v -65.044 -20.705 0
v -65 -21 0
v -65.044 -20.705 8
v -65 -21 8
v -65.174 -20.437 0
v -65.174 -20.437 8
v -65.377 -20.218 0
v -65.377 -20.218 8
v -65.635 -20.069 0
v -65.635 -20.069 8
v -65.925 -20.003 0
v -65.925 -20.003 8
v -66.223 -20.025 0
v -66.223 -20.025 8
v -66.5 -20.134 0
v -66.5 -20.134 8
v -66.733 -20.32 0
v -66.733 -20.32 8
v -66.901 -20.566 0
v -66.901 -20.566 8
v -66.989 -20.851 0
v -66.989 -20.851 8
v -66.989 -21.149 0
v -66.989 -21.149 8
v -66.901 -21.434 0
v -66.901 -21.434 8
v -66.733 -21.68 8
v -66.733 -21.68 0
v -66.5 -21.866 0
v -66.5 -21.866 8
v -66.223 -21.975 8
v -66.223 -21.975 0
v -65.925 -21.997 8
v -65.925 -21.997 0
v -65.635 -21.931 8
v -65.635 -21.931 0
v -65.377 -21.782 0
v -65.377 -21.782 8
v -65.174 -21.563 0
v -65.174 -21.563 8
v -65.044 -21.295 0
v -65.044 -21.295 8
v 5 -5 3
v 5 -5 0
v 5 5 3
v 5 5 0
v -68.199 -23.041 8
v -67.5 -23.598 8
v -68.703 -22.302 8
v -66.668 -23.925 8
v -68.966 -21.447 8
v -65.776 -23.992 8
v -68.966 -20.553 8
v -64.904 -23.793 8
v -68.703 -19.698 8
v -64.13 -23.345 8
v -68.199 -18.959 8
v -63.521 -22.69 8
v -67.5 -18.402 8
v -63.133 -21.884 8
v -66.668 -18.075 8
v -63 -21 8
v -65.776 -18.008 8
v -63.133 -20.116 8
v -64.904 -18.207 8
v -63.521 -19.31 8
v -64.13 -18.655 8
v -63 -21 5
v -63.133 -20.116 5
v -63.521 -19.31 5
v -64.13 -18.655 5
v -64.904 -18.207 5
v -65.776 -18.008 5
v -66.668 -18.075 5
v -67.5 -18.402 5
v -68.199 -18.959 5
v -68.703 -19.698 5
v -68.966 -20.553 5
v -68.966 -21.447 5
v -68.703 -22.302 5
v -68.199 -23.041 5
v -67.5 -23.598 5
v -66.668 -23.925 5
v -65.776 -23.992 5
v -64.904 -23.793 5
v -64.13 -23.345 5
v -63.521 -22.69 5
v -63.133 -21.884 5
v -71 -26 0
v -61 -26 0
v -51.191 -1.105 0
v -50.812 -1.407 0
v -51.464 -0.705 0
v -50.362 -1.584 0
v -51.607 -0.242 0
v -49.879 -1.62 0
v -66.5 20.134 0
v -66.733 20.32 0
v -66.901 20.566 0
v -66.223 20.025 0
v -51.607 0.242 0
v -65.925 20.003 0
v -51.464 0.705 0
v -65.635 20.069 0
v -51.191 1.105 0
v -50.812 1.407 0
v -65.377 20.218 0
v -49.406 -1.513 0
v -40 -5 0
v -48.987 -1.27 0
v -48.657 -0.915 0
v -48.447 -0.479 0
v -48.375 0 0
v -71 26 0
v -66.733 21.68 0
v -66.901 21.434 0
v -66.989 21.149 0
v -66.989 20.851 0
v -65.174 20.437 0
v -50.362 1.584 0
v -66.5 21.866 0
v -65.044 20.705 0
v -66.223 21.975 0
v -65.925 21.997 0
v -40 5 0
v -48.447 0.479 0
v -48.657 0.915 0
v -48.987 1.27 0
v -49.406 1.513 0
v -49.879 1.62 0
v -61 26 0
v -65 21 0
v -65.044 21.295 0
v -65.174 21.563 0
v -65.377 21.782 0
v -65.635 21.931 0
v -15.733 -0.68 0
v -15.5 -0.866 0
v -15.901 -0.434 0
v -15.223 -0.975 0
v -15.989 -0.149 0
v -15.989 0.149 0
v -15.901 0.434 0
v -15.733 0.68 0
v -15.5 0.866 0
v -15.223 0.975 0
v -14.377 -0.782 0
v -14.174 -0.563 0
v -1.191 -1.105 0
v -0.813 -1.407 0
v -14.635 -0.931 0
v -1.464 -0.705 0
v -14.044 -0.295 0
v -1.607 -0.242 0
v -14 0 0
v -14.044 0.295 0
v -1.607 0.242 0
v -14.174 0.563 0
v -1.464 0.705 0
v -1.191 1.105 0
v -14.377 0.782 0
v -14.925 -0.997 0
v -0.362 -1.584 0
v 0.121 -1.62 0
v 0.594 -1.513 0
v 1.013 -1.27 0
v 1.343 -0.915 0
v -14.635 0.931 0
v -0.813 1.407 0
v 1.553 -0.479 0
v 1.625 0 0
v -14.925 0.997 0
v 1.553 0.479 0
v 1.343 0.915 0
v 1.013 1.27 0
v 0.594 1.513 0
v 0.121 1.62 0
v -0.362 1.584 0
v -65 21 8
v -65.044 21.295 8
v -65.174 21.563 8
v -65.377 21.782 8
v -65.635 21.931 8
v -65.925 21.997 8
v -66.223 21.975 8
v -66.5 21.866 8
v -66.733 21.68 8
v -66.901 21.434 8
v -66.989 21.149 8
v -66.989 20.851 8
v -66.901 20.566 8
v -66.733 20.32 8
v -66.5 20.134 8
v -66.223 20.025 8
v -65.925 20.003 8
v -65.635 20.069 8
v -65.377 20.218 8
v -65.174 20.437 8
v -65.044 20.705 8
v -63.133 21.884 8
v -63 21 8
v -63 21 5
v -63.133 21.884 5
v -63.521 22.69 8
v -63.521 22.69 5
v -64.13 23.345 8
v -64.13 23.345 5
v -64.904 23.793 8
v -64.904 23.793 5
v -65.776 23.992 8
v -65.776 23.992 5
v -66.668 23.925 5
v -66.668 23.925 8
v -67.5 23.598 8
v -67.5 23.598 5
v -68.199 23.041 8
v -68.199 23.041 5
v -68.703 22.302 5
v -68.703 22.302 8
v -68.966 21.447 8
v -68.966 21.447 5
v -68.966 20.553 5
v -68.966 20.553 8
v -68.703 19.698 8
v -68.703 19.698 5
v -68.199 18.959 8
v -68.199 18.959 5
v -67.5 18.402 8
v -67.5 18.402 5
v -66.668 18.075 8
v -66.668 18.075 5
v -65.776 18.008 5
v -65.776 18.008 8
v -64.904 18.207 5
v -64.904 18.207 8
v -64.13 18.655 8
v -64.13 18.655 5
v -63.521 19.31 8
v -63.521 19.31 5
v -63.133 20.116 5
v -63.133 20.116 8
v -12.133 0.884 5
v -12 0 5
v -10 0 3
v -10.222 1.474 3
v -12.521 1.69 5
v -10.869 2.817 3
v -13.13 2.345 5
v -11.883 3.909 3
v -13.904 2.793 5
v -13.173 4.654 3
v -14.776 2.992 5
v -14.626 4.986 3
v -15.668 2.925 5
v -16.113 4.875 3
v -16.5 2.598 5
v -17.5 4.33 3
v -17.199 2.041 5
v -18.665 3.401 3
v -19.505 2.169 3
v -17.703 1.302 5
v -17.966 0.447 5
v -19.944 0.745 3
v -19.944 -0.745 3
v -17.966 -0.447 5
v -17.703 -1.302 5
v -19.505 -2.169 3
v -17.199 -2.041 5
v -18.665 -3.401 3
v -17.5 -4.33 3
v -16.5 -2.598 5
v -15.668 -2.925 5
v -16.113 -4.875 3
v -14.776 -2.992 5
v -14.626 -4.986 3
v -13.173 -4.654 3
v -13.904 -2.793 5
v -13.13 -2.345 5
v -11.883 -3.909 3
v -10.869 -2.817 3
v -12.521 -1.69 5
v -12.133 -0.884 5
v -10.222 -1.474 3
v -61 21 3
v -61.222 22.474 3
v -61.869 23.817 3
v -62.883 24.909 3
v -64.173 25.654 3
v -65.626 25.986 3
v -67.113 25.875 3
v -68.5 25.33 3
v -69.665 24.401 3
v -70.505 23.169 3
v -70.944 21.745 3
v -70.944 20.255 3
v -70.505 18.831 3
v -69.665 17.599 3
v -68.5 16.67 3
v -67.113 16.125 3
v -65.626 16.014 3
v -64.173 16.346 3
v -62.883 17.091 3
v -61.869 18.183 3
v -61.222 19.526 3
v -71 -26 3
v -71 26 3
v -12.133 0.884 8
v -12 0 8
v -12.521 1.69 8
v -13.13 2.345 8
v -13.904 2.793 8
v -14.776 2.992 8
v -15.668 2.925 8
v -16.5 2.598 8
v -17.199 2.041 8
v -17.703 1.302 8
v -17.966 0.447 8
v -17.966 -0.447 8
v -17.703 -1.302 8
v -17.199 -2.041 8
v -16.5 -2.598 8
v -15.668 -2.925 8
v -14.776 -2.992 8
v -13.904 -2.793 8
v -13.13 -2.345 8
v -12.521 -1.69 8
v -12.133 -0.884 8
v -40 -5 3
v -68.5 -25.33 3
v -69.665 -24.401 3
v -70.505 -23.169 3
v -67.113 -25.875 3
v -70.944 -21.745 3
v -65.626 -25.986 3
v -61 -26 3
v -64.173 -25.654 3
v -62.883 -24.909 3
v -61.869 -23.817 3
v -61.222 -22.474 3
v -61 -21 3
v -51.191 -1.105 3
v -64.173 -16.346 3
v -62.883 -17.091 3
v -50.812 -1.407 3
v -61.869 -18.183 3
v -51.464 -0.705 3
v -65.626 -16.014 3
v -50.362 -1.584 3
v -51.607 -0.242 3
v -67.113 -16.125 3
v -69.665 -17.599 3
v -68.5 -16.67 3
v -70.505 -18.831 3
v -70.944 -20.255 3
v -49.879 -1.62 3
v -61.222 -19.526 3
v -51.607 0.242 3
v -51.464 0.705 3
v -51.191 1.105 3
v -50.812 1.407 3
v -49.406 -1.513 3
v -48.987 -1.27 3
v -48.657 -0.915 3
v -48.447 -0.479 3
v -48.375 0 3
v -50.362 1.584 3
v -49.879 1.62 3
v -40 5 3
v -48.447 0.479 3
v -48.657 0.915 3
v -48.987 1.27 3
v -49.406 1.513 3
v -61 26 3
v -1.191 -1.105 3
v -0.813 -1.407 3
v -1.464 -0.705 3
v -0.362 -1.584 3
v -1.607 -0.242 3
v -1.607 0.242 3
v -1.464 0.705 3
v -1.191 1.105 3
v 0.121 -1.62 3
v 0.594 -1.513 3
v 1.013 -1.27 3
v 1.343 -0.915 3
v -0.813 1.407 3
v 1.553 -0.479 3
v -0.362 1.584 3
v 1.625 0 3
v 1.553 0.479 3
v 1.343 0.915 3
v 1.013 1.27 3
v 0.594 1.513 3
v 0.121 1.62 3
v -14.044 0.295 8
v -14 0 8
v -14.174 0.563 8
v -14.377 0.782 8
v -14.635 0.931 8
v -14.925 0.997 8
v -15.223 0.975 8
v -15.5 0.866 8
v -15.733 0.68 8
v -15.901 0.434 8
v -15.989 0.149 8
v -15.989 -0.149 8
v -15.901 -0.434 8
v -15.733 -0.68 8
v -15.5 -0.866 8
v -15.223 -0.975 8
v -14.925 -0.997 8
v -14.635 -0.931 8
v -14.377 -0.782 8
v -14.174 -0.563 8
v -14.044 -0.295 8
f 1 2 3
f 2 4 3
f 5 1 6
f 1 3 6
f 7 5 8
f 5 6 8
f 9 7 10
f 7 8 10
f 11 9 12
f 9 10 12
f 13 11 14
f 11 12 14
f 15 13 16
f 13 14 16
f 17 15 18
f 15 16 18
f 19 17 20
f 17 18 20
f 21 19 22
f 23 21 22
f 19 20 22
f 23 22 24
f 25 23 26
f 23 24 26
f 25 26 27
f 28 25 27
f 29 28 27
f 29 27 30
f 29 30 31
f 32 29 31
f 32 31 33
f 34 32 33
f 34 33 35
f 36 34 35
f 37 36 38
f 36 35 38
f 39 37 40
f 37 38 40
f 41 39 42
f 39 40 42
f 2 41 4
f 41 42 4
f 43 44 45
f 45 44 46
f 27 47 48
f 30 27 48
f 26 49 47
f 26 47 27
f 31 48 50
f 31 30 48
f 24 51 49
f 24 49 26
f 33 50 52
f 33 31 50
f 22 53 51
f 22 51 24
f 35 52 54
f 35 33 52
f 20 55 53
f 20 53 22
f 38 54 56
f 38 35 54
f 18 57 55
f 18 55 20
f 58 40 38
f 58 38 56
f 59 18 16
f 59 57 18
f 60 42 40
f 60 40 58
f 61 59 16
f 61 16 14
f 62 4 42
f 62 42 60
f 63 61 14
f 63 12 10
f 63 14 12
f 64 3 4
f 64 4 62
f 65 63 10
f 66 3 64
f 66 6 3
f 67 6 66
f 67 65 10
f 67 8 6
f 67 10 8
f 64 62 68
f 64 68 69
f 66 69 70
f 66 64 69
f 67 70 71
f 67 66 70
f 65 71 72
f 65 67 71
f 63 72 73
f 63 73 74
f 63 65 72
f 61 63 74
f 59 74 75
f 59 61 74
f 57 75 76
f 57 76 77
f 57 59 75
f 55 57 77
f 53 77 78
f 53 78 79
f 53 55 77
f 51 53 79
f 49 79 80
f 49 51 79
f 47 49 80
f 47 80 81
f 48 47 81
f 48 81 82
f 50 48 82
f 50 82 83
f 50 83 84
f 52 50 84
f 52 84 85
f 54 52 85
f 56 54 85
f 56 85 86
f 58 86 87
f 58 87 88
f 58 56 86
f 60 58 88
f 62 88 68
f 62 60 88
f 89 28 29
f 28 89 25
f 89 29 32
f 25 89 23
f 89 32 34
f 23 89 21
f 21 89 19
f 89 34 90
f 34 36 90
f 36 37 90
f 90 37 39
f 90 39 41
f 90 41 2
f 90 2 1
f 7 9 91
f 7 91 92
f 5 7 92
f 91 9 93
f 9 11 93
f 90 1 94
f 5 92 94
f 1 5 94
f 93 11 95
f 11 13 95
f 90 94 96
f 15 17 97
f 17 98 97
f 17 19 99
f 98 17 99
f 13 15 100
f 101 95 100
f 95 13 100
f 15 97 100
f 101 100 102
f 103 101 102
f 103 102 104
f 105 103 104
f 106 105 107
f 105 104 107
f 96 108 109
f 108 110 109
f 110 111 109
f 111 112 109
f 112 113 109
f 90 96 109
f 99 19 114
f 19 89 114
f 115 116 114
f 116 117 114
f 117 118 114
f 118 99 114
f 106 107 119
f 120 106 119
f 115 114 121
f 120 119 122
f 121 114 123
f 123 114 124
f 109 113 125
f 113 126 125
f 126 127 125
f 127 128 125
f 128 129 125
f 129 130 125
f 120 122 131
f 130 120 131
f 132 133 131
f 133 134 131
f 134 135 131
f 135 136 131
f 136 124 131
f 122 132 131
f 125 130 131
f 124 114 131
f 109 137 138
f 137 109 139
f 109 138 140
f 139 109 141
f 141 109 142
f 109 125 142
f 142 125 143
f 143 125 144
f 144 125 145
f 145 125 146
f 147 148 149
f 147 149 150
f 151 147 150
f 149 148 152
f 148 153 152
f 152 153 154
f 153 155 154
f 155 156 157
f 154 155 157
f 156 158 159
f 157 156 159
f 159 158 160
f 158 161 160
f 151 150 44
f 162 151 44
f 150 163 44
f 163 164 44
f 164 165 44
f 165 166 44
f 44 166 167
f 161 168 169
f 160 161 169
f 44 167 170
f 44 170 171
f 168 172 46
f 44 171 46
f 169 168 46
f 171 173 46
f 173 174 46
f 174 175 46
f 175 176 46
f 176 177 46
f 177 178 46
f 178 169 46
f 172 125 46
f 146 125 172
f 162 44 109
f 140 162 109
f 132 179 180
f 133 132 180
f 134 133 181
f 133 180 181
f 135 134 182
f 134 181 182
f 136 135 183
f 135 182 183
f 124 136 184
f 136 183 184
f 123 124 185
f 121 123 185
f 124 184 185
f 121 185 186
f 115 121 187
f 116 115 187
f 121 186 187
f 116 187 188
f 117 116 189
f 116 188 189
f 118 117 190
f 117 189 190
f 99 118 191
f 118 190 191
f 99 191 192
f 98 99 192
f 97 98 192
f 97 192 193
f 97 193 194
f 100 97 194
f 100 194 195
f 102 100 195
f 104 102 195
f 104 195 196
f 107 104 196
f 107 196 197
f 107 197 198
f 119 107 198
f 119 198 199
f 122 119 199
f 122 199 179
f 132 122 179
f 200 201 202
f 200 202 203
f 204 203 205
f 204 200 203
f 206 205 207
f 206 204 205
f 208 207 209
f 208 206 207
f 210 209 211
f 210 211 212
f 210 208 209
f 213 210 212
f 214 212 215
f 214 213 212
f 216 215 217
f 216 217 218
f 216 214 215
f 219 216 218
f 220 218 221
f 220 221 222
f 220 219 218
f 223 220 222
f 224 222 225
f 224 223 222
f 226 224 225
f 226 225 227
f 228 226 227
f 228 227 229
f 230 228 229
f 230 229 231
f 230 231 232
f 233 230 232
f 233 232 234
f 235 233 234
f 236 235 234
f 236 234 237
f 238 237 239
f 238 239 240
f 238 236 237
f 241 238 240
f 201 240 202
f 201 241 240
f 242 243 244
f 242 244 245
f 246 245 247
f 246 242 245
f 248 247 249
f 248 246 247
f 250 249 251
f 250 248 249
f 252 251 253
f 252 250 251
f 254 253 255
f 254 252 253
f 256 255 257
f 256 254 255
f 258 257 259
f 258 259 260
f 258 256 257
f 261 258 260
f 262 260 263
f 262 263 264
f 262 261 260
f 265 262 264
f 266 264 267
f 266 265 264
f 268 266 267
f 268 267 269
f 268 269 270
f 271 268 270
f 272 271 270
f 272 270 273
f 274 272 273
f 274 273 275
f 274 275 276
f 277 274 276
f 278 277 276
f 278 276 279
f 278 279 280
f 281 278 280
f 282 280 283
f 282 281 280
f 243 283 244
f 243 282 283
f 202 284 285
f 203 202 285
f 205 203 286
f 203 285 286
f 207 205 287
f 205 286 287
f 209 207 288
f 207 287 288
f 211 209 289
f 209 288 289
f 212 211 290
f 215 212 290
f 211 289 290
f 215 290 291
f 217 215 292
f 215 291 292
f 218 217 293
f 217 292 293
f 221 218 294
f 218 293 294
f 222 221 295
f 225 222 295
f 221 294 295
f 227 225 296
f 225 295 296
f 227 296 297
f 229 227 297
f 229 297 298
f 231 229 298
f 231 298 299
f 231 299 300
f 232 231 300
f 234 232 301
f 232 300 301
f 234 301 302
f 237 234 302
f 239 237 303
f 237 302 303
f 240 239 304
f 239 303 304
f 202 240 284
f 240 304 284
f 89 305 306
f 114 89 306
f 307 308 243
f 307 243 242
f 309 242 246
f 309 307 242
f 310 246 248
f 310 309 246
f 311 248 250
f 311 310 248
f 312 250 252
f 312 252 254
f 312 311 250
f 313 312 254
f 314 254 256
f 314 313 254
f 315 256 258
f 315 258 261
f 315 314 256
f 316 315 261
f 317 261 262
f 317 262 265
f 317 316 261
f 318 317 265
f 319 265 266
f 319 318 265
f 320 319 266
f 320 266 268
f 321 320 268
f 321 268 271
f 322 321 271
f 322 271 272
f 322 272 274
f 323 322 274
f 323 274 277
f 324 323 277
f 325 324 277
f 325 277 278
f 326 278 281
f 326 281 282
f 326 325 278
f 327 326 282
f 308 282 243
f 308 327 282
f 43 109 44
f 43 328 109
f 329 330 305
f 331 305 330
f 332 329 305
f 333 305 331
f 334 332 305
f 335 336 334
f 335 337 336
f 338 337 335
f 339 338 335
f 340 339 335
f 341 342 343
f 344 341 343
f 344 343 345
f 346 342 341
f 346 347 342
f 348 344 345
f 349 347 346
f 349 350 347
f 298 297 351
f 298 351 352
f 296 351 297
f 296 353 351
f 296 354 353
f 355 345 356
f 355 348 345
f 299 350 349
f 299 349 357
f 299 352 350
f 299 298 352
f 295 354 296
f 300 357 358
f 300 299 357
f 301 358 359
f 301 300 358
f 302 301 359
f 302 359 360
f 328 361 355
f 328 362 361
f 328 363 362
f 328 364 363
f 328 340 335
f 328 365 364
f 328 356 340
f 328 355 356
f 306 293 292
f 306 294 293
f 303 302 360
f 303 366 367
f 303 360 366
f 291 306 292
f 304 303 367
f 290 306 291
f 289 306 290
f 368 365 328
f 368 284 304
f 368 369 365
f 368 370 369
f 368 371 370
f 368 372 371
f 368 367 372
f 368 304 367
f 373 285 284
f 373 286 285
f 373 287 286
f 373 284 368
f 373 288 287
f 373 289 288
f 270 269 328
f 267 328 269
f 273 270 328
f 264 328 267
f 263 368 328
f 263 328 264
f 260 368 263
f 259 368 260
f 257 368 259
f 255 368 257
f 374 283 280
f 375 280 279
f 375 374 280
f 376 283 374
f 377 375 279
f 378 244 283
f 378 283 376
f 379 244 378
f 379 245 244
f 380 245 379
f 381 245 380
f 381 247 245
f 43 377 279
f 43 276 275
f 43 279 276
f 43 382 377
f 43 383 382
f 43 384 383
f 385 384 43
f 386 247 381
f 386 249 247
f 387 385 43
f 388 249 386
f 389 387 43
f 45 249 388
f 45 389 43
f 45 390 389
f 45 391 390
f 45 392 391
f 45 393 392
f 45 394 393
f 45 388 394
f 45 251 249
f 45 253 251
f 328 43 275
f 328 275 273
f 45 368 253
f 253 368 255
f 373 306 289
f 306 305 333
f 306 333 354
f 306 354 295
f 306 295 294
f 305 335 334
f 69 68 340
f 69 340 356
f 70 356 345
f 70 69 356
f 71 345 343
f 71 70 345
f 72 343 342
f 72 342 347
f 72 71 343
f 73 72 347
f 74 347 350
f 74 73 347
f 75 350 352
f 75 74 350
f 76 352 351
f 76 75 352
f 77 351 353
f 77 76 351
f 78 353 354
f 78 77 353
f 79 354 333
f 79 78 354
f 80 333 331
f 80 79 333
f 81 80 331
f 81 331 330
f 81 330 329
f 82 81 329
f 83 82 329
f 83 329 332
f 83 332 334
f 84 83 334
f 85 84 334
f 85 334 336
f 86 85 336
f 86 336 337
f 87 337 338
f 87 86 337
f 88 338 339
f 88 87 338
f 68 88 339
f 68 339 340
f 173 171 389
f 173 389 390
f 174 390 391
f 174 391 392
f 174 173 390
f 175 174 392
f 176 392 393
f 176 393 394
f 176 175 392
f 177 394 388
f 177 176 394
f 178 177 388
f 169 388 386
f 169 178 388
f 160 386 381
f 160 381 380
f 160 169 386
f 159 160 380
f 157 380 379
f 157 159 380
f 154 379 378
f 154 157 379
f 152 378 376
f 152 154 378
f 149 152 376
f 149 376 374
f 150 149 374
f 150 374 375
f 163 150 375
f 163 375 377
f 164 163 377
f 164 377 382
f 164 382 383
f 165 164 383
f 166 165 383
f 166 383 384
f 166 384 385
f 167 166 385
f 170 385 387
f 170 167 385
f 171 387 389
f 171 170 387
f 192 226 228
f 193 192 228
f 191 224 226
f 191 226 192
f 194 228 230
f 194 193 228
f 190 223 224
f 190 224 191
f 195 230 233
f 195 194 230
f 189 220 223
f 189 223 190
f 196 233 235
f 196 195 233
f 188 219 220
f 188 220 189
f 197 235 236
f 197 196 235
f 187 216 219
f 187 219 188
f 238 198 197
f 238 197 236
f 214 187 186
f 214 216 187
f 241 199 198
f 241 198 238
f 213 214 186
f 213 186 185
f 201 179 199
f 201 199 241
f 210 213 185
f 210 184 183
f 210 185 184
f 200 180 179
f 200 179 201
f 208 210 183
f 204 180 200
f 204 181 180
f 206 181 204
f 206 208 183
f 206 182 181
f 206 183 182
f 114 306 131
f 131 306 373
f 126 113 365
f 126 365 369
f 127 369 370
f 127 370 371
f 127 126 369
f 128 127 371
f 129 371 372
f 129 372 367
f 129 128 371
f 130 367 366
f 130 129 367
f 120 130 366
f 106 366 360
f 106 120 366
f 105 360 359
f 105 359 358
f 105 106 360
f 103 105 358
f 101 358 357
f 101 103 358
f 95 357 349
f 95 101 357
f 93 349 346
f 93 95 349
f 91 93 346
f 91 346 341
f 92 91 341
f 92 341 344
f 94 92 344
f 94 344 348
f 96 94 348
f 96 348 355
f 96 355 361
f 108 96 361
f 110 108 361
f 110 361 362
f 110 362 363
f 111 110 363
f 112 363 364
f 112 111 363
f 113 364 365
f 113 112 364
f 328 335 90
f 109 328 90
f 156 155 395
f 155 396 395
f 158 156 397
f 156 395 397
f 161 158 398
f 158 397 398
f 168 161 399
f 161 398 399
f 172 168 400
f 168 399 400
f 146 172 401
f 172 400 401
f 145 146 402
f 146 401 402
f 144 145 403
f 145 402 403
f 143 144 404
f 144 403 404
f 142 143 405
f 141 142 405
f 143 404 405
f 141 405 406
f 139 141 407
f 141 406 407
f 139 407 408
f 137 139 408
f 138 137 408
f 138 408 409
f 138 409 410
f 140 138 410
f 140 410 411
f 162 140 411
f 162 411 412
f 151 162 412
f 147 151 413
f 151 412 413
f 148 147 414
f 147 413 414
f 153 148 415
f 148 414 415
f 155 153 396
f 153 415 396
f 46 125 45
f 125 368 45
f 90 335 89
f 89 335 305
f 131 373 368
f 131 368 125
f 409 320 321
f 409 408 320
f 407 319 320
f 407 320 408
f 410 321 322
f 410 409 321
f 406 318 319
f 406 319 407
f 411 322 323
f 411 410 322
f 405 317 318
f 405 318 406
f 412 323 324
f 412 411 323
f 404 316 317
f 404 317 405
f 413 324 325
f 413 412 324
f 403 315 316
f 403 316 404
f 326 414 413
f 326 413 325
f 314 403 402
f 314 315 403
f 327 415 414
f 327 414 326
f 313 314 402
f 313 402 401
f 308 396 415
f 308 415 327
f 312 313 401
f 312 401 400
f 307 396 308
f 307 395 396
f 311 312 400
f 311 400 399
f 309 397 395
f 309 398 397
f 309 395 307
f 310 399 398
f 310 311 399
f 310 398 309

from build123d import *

# Parameters (mm, degrees)
CROQUIS1_W                = 10
CROQUIS1_H                = 10
CROQUIS1_R                = 1.625
SALIENTE_EXTRUIR1_DEPTH   = 3
SALIENTE_EXTRUIR1_2_DEPTH = 3
CROQUIS2_W                = 40
CROQUIS2_H                = 10
CROQUIS2_R                = 1
SALIENTE_EXTRUIR2_DEPTH   = 3
SALIENTE_EXTRUIR3_START   = 5
CROQUIS3_R                = 3
CROQUIS3_R_2              = 1
SALIENTE_EXTRUIR3_DEPTH   = 5
CHAFL_N1_SIZE             = 2
CHAFL_N2_SIZE             = 21


with BuildPart() as part:
    # Croquis1 → Saliente-Extruir1 (new body)
    with BuildSketch(Plane.XY):
        Rectangle(CROQUIS1_W, CROQUIS1_H)
        Circle(CROQUIS1_R, mode=Mode.SUBTRACT)
    extrude(amount=SALIENTE_EXTRUIR1_DEPTH)



with BuildPart() as body_2:
    # Croquis1 → Saliente-Extruir1 2 (new body)
    with BuildSketch(Plane.XY):
        with Locations((-50, 0)):
            Rectangle(CROQUIS1_W, CROQUIS1_H)
        with Locations((-50, 0)):
            Circle(CROQUIS1_R, mode=Mode.SUBTRACT)
    extrude(amount=SALIENTE_EXTRUIR1_2_DEPTH)


with BuildPart() as part_1:
    add(part.part)

    add(body_2.part)  # Saliente-Extruir2 merges body 2
    # Croquis2 → Saliente-Extruir2 (add)
    # profile 1 of 2: a face of its own
    with BuildSketch(Plane.XY.offset(3)):
        with Locations((-25, 0)):
            Rectangle(CROQUIS2_W, CROQUIS2_H)
        with Locations((-15, 0)):
            Circle(CROQUIS2_R, mode=Mode.SUBTRACT)
    # profile 2 of 2: a face of its own
    with BuildSketch(Plane.XY.offset(3)):
        Polygon((-61, -5), (-61, -26), (-71, -26), (-71, 26), (-61, 26), (-61, 5), (-55, 5), (-55, -5), align=None)
        with Locations((-66, 21)):
            Circle(CROQUIS2_R, mode=Mode.SUBTRACT)
        with Locations((-66, -21)):
            Circle(CROQUIS2_R, mode=Mode.SUBTRACT)
    extrude(amount=-SALIENTE_EXTRUIR2_DEPTH)

    # Croquis3 → Saliente-Extruir3 (add)
    # profile 1 of 3: a face of its own
    with BuildSketch(Plane.XY.offset(3).offset(SALIENTE_EXTRUIR3_START)):
        with Locations((-66, 21)):
            Circle(CROQUIS3_R)
        with Locations((-66, 21)):
            Circle(CROQUIS3_R_2, mode=Mode.SUBTRACT)
    # profile 2 of 3: a face of its own
    with BuildSketch(Plane.XY.offset(3).offset(SALIENTE_EXTRUIR3_START)):
        with Locations((-66, -21)):
            Circle(CROQUIS3_R)
        with Locations((-66, -21)):
            Circle(CROQUIS3_R_2, mode=Mode.SUBTRACT)
    # profile 3 of 3: a face of its own
    with BuildSketch(Plane.XY.offset(3).offset(SALIENTE_EXTRUIR3_START)):
        with Locations((-15, 0)):
            Circle(CROQUIS3_R)
        with Locations((-15, 0)):
            Circle(CROQUIS3_R_2, mode=Mode.SUBTRACT)
    extrude(amount=-SALIENTE_EXTRUIR3_DEPTH)

    # Chaflán1
    chafl_n1_edges = [part_1.edges().sort_by_distance(p)[0] for p in [
        (-69, 21, 3),
        (-69, -21, 3),
        (-18, 0, 3),
    ]]
    chamfer(chafl_n1_edges, length=CHAFL_N1_SIZE - 0.0001)  # a hair under: the kernel refuses the full size

    # Chaflán2
    chafl_n2_edges = [part_1.edges().sort_by_distance(p)[0] for p in [
        (-61, 5, 1.5),
        (-61, -5, 1.5),
    ]]
    chamfer(chafl_n2_edges, length=CHAFL_N2_SIZE - 0.0001)  # a hair under: the kernel refuses the full size


solid = part_1.part
